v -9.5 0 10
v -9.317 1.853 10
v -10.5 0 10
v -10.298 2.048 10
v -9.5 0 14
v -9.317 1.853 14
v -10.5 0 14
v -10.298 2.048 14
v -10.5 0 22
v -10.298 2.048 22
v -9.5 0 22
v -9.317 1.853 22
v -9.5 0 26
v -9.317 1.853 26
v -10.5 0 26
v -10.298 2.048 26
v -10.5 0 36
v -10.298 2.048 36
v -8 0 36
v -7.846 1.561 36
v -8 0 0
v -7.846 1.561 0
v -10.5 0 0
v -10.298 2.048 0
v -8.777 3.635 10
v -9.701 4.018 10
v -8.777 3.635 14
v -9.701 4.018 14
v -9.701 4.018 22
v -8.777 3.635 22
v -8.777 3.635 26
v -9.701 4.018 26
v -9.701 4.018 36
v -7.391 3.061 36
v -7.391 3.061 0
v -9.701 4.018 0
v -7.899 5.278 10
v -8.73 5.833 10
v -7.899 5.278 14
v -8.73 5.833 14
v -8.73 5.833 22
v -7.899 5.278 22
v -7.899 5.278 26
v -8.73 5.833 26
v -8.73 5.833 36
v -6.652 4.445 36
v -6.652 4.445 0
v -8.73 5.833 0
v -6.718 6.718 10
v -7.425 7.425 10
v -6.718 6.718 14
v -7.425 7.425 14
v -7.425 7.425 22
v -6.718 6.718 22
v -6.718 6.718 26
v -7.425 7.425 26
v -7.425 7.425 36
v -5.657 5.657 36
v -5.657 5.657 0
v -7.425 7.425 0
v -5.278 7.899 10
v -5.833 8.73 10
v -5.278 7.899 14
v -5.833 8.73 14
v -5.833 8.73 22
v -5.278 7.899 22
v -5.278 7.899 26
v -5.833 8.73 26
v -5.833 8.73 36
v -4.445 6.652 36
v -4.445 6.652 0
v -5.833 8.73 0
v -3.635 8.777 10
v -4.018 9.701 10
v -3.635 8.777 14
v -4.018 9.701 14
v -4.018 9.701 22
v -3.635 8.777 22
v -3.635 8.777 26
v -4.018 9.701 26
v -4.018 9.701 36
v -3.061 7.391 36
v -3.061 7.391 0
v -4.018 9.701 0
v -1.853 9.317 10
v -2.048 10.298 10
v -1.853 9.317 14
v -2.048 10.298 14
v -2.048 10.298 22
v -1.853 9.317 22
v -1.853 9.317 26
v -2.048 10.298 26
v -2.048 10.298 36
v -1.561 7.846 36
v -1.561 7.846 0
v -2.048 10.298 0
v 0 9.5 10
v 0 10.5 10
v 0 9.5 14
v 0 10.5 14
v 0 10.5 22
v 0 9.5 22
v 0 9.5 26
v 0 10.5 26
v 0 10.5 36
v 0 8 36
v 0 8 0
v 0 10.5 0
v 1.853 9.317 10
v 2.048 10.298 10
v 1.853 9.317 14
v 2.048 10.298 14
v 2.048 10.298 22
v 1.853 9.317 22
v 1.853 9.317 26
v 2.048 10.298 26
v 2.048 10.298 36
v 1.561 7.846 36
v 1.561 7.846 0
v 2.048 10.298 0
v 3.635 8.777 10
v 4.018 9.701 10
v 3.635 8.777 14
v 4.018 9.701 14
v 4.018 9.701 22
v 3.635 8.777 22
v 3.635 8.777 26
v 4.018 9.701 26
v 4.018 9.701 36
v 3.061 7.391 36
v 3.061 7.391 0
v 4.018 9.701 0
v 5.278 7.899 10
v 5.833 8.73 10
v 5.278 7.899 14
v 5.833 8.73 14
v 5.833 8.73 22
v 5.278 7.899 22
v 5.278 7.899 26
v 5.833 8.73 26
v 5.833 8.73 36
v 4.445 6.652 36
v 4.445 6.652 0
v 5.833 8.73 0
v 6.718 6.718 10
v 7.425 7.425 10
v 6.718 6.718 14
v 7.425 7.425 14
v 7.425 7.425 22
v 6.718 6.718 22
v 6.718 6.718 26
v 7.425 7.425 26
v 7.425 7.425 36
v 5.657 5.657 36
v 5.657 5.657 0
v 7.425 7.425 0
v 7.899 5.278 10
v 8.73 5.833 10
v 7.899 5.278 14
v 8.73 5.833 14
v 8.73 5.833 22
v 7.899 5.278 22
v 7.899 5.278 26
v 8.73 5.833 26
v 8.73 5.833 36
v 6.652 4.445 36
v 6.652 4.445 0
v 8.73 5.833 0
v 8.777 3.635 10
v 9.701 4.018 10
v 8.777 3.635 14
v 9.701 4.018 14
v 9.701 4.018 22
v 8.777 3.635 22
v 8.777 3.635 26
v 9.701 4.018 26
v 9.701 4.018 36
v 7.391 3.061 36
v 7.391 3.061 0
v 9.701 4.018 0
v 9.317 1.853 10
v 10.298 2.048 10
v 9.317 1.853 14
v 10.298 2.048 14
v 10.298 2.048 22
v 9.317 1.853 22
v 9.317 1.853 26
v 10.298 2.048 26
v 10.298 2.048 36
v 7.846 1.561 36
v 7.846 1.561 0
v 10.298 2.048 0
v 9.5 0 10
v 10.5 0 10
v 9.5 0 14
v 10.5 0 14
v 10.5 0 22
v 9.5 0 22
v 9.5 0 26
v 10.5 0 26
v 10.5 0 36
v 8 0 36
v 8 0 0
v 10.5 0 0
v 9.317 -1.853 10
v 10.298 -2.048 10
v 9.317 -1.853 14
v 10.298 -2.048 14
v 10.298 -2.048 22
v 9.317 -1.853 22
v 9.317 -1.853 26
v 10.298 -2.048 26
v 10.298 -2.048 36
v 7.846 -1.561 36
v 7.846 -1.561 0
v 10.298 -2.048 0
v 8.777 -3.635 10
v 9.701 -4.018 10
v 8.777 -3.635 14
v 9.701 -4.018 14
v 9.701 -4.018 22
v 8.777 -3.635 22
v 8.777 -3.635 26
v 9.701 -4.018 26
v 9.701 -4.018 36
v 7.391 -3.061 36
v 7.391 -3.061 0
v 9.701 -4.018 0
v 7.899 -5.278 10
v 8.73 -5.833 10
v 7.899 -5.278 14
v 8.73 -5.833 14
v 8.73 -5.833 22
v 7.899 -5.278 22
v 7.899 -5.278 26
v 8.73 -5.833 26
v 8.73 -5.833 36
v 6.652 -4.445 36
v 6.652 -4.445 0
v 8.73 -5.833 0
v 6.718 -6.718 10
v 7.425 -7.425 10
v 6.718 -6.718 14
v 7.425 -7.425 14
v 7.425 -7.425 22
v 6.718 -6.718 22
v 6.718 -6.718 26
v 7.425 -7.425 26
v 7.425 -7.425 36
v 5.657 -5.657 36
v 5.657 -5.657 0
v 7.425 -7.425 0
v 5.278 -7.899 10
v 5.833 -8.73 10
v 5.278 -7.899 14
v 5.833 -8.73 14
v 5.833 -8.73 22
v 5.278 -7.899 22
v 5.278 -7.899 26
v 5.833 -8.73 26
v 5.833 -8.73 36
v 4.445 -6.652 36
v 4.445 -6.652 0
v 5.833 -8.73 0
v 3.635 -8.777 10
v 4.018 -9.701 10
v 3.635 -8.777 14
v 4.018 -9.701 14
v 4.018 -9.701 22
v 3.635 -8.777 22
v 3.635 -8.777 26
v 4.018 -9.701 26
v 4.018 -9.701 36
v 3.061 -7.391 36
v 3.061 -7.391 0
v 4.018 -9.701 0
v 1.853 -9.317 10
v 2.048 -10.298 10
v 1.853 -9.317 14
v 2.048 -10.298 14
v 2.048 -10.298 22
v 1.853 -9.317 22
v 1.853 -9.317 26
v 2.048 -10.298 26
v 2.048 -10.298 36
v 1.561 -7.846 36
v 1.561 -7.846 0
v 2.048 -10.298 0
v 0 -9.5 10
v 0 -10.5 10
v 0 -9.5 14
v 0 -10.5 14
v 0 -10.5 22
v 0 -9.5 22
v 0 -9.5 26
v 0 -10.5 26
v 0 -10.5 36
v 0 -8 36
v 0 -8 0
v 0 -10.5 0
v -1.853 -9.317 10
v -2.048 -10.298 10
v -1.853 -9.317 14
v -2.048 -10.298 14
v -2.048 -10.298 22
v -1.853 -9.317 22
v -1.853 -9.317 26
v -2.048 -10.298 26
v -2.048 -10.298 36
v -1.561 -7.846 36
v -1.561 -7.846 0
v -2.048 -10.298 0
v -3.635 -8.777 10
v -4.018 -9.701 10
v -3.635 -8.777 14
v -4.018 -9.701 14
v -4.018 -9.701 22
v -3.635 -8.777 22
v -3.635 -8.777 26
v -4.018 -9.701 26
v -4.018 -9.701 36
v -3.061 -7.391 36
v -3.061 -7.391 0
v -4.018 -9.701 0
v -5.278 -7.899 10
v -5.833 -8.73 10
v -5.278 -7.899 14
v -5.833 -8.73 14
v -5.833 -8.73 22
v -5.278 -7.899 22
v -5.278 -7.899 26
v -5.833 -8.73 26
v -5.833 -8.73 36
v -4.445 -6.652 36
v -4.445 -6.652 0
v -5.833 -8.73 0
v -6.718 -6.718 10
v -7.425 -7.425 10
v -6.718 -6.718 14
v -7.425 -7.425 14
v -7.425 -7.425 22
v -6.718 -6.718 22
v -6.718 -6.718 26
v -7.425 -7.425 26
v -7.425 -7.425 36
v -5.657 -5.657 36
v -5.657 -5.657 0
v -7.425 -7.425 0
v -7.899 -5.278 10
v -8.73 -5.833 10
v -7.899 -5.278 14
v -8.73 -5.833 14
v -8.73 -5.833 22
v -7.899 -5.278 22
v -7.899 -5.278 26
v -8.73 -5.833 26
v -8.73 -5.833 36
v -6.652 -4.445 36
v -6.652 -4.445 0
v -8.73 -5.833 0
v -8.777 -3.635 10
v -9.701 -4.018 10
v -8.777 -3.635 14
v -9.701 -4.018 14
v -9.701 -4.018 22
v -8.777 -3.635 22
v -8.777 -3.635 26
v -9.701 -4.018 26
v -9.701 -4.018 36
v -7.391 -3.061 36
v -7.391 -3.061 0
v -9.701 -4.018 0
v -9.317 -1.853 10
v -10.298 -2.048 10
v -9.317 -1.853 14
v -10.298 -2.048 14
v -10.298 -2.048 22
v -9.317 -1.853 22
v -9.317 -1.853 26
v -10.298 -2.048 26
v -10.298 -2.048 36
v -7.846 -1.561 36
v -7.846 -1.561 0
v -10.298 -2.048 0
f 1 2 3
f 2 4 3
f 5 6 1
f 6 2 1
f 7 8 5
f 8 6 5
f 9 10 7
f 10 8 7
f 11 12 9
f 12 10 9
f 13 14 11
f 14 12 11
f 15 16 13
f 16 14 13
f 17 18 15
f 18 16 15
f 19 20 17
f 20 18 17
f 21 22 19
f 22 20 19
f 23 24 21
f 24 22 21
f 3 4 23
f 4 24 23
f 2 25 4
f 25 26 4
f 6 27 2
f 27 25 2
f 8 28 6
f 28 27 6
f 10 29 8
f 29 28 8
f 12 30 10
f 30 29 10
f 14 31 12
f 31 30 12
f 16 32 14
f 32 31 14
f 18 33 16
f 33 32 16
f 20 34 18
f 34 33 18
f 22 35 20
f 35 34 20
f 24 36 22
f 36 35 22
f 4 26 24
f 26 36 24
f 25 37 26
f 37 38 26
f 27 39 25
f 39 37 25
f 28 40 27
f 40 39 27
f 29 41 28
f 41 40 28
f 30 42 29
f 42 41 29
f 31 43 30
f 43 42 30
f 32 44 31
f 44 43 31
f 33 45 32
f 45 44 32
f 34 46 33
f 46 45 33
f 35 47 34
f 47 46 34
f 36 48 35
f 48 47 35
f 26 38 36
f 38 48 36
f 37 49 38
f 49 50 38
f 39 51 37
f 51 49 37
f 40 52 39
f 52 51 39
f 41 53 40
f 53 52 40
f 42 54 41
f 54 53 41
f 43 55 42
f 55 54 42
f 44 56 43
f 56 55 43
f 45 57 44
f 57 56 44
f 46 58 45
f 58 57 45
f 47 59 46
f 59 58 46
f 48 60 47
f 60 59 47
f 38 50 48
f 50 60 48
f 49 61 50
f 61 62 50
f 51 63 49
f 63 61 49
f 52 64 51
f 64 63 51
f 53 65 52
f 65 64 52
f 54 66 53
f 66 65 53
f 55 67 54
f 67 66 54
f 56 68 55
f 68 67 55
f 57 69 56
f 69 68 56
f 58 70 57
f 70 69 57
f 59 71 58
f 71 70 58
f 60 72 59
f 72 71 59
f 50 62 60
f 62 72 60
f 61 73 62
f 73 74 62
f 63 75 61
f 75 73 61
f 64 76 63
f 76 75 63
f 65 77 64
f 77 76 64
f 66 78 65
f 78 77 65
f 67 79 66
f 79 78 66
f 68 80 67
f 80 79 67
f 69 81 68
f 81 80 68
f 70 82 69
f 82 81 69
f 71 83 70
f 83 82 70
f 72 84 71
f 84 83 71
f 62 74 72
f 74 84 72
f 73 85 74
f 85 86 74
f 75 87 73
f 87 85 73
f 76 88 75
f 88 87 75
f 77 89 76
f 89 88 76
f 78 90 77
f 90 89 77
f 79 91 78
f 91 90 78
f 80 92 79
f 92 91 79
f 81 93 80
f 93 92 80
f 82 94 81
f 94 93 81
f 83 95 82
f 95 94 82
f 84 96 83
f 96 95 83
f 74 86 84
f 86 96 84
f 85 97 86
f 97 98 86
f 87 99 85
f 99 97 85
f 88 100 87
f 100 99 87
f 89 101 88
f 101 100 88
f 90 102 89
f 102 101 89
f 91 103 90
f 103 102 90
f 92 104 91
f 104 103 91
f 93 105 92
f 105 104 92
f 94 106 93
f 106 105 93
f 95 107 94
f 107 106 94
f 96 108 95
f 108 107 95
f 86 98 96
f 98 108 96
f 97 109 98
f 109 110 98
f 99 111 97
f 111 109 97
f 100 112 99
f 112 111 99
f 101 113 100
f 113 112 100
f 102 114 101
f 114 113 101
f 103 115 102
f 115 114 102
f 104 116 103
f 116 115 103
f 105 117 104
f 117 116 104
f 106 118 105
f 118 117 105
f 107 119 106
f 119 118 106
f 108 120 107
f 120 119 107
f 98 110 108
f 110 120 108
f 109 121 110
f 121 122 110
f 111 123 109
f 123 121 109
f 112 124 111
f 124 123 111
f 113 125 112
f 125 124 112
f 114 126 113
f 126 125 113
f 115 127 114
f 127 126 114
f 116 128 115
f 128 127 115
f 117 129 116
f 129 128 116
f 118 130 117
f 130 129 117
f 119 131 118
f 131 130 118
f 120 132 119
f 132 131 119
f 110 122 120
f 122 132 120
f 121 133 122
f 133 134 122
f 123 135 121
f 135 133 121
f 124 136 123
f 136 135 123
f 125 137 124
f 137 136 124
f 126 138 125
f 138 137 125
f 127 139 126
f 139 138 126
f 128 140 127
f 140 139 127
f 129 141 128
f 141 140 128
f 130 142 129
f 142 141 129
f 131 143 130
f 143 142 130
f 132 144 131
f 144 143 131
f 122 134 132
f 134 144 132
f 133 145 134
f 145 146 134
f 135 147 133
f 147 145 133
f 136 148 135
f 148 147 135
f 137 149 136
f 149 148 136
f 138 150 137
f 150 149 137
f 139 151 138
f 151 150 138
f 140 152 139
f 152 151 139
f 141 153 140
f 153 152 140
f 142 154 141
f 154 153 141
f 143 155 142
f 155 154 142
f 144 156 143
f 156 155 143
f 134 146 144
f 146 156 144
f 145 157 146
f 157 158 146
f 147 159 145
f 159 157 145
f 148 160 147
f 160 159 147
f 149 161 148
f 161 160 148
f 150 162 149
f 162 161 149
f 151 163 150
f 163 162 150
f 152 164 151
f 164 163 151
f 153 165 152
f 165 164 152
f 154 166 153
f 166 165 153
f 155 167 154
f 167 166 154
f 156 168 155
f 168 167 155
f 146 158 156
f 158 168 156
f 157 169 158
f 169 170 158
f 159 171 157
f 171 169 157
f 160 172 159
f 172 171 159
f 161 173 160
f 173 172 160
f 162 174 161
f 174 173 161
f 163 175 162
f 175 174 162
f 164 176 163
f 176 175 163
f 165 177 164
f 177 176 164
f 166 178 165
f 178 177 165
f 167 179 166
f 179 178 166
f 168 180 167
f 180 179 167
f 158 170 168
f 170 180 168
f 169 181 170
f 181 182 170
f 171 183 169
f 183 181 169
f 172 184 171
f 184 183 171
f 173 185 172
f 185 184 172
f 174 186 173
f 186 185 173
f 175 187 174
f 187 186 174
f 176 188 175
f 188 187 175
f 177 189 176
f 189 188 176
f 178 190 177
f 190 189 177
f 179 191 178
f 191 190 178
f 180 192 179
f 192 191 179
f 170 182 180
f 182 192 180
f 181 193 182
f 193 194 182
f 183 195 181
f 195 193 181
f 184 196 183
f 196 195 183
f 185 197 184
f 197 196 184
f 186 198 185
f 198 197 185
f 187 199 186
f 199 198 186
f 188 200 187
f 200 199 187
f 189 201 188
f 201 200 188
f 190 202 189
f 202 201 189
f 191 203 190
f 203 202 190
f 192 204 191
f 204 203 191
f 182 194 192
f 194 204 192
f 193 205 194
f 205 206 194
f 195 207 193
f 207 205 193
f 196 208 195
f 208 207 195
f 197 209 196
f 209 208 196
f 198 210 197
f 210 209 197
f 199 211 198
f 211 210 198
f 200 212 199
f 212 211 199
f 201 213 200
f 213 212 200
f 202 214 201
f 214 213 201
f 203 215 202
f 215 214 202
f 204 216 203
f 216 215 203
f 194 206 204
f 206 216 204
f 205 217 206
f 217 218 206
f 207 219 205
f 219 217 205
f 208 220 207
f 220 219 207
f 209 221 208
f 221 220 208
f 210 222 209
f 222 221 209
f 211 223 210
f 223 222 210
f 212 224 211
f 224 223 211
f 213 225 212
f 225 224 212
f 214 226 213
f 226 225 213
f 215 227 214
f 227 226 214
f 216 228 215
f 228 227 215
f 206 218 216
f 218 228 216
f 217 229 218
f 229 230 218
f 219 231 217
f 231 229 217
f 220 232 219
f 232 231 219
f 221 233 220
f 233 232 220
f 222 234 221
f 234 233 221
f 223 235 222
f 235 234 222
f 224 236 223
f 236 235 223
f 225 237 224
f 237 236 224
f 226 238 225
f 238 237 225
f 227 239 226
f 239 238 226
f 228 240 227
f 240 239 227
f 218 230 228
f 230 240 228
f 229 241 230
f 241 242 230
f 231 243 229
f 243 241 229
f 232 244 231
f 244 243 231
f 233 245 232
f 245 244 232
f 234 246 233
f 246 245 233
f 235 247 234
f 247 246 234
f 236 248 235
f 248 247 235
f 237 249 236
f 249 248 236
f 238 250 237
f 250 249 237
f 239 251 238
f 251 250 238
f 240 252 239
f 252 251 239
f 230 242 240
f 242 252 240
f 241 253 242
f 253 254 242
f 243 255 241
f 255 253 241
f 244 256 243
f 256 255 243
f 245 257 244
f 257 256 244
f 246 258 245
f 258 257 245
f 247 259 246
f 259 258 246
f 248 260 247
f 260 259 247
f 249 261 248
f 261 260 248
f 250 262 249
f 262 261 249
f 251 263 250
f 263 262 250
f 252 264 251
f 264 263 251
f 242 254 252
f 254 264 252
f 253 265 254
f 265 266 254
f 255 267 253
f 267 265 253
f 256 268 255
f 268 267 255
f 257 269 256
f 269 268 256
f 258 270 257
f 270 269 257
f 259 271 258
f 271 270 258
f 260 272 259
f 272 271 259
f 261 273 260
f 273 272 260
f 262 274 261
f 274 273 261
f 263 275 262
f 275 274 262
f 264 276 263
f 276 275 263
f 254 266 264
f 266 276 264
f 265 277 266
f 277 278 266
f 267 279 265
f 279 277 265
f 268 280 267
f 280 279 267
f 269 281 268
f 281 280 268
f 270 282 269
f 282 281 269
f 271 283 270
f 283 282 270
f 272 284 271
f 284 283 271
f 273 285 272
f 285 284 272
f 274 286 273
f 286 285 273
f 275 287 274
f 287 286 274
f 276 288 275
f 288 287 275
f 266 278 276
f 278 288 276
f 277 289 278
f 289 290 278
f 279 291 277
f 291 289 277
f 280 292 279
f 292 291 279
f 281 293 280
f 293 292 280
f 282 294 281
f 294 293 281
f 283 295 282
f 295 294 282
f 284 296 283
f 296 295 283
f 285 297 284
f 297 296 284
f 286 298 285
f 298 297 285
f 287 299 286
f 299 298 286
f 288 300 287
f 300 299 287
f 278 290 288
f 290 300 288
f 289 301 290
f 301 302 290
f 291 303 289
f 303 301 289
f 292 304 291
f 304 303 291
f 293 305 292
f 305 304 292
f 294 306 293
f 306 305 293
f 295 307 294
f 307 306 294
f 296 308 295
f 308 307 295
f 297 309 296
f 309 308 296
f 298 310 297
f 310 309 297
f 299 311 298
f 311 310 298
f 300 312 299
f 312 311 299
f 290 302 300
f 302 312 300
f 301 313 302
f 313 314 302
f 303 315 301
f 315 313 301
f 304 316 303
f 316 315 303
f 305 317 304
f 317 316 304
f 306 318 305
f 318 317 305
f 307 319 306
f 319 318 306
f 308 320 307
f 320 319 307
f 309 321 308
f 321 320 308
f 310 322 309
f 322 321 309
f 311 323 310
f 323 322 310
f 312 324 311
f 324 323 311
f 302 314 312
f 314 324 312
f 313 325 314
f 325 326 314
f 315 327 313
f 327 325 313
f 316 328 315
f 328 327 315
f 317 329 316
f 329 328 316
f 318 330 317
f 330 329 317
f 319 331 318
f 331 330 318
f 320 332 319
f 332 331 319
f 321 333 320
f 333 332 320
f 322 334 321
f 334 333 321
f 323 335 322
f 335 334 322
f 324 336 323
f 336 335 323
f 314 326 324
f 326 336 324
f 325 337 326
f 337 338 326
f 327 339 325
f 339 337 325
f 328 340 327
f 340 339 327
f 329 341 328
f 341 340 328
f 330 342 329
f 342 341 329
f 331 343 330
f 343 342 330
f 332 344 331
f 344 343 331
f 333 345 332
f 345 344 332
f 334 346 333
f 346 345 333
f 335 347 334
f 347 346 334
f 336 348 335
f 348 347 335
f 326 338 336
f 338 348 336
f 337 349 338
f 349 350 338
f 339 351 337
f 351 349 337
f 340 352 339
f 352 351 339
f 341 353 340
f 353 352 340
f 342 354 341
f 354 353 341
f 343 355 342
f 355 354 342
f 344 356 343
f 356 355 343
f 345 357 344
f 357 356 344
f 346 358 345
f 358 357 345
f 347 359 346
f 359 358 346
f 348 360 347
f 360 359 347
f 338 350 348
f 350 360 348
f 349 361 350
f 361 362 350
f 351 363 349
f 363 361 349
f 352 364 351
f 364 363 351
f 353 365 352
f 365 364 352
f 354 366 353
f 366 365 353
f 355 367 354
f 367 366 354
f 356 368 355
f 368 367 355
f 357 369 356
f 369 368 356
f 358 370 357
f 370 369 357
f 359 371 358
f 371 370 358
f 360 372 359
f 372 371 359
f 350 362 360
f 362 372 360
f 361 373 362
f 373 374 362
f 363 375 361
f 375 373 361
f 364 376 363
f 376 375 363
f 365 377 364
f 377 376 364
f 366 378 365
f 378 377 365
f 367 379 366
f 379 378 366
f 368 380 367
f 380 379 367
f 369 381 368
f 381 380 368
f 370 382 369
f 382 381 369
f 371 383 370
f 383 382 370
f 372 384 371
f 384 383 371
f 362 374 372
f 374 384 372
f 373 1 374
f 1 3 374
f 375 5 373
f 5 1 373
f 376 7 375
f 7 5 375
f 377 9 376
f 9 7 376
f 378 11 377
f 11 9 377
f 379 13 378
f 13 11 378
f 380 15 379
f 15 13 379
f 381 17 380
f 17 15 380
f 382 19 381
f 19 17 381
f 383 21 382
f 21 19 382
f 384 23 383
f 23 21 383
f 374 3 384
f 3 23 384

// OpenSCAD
$fn = 32;

// ----------------------------------------------------------------------
// Grooved revolve: plain_grooves, bore R8
// ----------------------------------------------------------------------

// --- parameters (mm) ---
bore_r = 8;               // bore radius
outer_r = 10.5;           // outer radius of the body
total_h = 36;             // overall height, Z
wall = 2.5;               // radial wall thickness
groove_w = 4;             // groove width
groove_d = 1;             // groove depth
grooves = 2;              // number of outer grooves

bbox_x = 2 * outer_r;  // full diameter
bore_d = 2 * bore_r;  // bore diameter
body_d = 2 * outer_r;  // body diameter
revolve_angle = 360;  // full turn around the Z axis

profile = [[8, 0], [10.5, 0], [10.5, 10], [9.5, 10], [9.5, 14], [10.5, 14], [10.5, 22], [9.5, 22], [9.5, 26], [10.5, 26], [10.5, 36], [8, 36]];  // primary outline, 12 points, counter clockwise

// --- the one profile operation ---
rotate_extrude(angle = revolve_angle) polygon(points = profile);
